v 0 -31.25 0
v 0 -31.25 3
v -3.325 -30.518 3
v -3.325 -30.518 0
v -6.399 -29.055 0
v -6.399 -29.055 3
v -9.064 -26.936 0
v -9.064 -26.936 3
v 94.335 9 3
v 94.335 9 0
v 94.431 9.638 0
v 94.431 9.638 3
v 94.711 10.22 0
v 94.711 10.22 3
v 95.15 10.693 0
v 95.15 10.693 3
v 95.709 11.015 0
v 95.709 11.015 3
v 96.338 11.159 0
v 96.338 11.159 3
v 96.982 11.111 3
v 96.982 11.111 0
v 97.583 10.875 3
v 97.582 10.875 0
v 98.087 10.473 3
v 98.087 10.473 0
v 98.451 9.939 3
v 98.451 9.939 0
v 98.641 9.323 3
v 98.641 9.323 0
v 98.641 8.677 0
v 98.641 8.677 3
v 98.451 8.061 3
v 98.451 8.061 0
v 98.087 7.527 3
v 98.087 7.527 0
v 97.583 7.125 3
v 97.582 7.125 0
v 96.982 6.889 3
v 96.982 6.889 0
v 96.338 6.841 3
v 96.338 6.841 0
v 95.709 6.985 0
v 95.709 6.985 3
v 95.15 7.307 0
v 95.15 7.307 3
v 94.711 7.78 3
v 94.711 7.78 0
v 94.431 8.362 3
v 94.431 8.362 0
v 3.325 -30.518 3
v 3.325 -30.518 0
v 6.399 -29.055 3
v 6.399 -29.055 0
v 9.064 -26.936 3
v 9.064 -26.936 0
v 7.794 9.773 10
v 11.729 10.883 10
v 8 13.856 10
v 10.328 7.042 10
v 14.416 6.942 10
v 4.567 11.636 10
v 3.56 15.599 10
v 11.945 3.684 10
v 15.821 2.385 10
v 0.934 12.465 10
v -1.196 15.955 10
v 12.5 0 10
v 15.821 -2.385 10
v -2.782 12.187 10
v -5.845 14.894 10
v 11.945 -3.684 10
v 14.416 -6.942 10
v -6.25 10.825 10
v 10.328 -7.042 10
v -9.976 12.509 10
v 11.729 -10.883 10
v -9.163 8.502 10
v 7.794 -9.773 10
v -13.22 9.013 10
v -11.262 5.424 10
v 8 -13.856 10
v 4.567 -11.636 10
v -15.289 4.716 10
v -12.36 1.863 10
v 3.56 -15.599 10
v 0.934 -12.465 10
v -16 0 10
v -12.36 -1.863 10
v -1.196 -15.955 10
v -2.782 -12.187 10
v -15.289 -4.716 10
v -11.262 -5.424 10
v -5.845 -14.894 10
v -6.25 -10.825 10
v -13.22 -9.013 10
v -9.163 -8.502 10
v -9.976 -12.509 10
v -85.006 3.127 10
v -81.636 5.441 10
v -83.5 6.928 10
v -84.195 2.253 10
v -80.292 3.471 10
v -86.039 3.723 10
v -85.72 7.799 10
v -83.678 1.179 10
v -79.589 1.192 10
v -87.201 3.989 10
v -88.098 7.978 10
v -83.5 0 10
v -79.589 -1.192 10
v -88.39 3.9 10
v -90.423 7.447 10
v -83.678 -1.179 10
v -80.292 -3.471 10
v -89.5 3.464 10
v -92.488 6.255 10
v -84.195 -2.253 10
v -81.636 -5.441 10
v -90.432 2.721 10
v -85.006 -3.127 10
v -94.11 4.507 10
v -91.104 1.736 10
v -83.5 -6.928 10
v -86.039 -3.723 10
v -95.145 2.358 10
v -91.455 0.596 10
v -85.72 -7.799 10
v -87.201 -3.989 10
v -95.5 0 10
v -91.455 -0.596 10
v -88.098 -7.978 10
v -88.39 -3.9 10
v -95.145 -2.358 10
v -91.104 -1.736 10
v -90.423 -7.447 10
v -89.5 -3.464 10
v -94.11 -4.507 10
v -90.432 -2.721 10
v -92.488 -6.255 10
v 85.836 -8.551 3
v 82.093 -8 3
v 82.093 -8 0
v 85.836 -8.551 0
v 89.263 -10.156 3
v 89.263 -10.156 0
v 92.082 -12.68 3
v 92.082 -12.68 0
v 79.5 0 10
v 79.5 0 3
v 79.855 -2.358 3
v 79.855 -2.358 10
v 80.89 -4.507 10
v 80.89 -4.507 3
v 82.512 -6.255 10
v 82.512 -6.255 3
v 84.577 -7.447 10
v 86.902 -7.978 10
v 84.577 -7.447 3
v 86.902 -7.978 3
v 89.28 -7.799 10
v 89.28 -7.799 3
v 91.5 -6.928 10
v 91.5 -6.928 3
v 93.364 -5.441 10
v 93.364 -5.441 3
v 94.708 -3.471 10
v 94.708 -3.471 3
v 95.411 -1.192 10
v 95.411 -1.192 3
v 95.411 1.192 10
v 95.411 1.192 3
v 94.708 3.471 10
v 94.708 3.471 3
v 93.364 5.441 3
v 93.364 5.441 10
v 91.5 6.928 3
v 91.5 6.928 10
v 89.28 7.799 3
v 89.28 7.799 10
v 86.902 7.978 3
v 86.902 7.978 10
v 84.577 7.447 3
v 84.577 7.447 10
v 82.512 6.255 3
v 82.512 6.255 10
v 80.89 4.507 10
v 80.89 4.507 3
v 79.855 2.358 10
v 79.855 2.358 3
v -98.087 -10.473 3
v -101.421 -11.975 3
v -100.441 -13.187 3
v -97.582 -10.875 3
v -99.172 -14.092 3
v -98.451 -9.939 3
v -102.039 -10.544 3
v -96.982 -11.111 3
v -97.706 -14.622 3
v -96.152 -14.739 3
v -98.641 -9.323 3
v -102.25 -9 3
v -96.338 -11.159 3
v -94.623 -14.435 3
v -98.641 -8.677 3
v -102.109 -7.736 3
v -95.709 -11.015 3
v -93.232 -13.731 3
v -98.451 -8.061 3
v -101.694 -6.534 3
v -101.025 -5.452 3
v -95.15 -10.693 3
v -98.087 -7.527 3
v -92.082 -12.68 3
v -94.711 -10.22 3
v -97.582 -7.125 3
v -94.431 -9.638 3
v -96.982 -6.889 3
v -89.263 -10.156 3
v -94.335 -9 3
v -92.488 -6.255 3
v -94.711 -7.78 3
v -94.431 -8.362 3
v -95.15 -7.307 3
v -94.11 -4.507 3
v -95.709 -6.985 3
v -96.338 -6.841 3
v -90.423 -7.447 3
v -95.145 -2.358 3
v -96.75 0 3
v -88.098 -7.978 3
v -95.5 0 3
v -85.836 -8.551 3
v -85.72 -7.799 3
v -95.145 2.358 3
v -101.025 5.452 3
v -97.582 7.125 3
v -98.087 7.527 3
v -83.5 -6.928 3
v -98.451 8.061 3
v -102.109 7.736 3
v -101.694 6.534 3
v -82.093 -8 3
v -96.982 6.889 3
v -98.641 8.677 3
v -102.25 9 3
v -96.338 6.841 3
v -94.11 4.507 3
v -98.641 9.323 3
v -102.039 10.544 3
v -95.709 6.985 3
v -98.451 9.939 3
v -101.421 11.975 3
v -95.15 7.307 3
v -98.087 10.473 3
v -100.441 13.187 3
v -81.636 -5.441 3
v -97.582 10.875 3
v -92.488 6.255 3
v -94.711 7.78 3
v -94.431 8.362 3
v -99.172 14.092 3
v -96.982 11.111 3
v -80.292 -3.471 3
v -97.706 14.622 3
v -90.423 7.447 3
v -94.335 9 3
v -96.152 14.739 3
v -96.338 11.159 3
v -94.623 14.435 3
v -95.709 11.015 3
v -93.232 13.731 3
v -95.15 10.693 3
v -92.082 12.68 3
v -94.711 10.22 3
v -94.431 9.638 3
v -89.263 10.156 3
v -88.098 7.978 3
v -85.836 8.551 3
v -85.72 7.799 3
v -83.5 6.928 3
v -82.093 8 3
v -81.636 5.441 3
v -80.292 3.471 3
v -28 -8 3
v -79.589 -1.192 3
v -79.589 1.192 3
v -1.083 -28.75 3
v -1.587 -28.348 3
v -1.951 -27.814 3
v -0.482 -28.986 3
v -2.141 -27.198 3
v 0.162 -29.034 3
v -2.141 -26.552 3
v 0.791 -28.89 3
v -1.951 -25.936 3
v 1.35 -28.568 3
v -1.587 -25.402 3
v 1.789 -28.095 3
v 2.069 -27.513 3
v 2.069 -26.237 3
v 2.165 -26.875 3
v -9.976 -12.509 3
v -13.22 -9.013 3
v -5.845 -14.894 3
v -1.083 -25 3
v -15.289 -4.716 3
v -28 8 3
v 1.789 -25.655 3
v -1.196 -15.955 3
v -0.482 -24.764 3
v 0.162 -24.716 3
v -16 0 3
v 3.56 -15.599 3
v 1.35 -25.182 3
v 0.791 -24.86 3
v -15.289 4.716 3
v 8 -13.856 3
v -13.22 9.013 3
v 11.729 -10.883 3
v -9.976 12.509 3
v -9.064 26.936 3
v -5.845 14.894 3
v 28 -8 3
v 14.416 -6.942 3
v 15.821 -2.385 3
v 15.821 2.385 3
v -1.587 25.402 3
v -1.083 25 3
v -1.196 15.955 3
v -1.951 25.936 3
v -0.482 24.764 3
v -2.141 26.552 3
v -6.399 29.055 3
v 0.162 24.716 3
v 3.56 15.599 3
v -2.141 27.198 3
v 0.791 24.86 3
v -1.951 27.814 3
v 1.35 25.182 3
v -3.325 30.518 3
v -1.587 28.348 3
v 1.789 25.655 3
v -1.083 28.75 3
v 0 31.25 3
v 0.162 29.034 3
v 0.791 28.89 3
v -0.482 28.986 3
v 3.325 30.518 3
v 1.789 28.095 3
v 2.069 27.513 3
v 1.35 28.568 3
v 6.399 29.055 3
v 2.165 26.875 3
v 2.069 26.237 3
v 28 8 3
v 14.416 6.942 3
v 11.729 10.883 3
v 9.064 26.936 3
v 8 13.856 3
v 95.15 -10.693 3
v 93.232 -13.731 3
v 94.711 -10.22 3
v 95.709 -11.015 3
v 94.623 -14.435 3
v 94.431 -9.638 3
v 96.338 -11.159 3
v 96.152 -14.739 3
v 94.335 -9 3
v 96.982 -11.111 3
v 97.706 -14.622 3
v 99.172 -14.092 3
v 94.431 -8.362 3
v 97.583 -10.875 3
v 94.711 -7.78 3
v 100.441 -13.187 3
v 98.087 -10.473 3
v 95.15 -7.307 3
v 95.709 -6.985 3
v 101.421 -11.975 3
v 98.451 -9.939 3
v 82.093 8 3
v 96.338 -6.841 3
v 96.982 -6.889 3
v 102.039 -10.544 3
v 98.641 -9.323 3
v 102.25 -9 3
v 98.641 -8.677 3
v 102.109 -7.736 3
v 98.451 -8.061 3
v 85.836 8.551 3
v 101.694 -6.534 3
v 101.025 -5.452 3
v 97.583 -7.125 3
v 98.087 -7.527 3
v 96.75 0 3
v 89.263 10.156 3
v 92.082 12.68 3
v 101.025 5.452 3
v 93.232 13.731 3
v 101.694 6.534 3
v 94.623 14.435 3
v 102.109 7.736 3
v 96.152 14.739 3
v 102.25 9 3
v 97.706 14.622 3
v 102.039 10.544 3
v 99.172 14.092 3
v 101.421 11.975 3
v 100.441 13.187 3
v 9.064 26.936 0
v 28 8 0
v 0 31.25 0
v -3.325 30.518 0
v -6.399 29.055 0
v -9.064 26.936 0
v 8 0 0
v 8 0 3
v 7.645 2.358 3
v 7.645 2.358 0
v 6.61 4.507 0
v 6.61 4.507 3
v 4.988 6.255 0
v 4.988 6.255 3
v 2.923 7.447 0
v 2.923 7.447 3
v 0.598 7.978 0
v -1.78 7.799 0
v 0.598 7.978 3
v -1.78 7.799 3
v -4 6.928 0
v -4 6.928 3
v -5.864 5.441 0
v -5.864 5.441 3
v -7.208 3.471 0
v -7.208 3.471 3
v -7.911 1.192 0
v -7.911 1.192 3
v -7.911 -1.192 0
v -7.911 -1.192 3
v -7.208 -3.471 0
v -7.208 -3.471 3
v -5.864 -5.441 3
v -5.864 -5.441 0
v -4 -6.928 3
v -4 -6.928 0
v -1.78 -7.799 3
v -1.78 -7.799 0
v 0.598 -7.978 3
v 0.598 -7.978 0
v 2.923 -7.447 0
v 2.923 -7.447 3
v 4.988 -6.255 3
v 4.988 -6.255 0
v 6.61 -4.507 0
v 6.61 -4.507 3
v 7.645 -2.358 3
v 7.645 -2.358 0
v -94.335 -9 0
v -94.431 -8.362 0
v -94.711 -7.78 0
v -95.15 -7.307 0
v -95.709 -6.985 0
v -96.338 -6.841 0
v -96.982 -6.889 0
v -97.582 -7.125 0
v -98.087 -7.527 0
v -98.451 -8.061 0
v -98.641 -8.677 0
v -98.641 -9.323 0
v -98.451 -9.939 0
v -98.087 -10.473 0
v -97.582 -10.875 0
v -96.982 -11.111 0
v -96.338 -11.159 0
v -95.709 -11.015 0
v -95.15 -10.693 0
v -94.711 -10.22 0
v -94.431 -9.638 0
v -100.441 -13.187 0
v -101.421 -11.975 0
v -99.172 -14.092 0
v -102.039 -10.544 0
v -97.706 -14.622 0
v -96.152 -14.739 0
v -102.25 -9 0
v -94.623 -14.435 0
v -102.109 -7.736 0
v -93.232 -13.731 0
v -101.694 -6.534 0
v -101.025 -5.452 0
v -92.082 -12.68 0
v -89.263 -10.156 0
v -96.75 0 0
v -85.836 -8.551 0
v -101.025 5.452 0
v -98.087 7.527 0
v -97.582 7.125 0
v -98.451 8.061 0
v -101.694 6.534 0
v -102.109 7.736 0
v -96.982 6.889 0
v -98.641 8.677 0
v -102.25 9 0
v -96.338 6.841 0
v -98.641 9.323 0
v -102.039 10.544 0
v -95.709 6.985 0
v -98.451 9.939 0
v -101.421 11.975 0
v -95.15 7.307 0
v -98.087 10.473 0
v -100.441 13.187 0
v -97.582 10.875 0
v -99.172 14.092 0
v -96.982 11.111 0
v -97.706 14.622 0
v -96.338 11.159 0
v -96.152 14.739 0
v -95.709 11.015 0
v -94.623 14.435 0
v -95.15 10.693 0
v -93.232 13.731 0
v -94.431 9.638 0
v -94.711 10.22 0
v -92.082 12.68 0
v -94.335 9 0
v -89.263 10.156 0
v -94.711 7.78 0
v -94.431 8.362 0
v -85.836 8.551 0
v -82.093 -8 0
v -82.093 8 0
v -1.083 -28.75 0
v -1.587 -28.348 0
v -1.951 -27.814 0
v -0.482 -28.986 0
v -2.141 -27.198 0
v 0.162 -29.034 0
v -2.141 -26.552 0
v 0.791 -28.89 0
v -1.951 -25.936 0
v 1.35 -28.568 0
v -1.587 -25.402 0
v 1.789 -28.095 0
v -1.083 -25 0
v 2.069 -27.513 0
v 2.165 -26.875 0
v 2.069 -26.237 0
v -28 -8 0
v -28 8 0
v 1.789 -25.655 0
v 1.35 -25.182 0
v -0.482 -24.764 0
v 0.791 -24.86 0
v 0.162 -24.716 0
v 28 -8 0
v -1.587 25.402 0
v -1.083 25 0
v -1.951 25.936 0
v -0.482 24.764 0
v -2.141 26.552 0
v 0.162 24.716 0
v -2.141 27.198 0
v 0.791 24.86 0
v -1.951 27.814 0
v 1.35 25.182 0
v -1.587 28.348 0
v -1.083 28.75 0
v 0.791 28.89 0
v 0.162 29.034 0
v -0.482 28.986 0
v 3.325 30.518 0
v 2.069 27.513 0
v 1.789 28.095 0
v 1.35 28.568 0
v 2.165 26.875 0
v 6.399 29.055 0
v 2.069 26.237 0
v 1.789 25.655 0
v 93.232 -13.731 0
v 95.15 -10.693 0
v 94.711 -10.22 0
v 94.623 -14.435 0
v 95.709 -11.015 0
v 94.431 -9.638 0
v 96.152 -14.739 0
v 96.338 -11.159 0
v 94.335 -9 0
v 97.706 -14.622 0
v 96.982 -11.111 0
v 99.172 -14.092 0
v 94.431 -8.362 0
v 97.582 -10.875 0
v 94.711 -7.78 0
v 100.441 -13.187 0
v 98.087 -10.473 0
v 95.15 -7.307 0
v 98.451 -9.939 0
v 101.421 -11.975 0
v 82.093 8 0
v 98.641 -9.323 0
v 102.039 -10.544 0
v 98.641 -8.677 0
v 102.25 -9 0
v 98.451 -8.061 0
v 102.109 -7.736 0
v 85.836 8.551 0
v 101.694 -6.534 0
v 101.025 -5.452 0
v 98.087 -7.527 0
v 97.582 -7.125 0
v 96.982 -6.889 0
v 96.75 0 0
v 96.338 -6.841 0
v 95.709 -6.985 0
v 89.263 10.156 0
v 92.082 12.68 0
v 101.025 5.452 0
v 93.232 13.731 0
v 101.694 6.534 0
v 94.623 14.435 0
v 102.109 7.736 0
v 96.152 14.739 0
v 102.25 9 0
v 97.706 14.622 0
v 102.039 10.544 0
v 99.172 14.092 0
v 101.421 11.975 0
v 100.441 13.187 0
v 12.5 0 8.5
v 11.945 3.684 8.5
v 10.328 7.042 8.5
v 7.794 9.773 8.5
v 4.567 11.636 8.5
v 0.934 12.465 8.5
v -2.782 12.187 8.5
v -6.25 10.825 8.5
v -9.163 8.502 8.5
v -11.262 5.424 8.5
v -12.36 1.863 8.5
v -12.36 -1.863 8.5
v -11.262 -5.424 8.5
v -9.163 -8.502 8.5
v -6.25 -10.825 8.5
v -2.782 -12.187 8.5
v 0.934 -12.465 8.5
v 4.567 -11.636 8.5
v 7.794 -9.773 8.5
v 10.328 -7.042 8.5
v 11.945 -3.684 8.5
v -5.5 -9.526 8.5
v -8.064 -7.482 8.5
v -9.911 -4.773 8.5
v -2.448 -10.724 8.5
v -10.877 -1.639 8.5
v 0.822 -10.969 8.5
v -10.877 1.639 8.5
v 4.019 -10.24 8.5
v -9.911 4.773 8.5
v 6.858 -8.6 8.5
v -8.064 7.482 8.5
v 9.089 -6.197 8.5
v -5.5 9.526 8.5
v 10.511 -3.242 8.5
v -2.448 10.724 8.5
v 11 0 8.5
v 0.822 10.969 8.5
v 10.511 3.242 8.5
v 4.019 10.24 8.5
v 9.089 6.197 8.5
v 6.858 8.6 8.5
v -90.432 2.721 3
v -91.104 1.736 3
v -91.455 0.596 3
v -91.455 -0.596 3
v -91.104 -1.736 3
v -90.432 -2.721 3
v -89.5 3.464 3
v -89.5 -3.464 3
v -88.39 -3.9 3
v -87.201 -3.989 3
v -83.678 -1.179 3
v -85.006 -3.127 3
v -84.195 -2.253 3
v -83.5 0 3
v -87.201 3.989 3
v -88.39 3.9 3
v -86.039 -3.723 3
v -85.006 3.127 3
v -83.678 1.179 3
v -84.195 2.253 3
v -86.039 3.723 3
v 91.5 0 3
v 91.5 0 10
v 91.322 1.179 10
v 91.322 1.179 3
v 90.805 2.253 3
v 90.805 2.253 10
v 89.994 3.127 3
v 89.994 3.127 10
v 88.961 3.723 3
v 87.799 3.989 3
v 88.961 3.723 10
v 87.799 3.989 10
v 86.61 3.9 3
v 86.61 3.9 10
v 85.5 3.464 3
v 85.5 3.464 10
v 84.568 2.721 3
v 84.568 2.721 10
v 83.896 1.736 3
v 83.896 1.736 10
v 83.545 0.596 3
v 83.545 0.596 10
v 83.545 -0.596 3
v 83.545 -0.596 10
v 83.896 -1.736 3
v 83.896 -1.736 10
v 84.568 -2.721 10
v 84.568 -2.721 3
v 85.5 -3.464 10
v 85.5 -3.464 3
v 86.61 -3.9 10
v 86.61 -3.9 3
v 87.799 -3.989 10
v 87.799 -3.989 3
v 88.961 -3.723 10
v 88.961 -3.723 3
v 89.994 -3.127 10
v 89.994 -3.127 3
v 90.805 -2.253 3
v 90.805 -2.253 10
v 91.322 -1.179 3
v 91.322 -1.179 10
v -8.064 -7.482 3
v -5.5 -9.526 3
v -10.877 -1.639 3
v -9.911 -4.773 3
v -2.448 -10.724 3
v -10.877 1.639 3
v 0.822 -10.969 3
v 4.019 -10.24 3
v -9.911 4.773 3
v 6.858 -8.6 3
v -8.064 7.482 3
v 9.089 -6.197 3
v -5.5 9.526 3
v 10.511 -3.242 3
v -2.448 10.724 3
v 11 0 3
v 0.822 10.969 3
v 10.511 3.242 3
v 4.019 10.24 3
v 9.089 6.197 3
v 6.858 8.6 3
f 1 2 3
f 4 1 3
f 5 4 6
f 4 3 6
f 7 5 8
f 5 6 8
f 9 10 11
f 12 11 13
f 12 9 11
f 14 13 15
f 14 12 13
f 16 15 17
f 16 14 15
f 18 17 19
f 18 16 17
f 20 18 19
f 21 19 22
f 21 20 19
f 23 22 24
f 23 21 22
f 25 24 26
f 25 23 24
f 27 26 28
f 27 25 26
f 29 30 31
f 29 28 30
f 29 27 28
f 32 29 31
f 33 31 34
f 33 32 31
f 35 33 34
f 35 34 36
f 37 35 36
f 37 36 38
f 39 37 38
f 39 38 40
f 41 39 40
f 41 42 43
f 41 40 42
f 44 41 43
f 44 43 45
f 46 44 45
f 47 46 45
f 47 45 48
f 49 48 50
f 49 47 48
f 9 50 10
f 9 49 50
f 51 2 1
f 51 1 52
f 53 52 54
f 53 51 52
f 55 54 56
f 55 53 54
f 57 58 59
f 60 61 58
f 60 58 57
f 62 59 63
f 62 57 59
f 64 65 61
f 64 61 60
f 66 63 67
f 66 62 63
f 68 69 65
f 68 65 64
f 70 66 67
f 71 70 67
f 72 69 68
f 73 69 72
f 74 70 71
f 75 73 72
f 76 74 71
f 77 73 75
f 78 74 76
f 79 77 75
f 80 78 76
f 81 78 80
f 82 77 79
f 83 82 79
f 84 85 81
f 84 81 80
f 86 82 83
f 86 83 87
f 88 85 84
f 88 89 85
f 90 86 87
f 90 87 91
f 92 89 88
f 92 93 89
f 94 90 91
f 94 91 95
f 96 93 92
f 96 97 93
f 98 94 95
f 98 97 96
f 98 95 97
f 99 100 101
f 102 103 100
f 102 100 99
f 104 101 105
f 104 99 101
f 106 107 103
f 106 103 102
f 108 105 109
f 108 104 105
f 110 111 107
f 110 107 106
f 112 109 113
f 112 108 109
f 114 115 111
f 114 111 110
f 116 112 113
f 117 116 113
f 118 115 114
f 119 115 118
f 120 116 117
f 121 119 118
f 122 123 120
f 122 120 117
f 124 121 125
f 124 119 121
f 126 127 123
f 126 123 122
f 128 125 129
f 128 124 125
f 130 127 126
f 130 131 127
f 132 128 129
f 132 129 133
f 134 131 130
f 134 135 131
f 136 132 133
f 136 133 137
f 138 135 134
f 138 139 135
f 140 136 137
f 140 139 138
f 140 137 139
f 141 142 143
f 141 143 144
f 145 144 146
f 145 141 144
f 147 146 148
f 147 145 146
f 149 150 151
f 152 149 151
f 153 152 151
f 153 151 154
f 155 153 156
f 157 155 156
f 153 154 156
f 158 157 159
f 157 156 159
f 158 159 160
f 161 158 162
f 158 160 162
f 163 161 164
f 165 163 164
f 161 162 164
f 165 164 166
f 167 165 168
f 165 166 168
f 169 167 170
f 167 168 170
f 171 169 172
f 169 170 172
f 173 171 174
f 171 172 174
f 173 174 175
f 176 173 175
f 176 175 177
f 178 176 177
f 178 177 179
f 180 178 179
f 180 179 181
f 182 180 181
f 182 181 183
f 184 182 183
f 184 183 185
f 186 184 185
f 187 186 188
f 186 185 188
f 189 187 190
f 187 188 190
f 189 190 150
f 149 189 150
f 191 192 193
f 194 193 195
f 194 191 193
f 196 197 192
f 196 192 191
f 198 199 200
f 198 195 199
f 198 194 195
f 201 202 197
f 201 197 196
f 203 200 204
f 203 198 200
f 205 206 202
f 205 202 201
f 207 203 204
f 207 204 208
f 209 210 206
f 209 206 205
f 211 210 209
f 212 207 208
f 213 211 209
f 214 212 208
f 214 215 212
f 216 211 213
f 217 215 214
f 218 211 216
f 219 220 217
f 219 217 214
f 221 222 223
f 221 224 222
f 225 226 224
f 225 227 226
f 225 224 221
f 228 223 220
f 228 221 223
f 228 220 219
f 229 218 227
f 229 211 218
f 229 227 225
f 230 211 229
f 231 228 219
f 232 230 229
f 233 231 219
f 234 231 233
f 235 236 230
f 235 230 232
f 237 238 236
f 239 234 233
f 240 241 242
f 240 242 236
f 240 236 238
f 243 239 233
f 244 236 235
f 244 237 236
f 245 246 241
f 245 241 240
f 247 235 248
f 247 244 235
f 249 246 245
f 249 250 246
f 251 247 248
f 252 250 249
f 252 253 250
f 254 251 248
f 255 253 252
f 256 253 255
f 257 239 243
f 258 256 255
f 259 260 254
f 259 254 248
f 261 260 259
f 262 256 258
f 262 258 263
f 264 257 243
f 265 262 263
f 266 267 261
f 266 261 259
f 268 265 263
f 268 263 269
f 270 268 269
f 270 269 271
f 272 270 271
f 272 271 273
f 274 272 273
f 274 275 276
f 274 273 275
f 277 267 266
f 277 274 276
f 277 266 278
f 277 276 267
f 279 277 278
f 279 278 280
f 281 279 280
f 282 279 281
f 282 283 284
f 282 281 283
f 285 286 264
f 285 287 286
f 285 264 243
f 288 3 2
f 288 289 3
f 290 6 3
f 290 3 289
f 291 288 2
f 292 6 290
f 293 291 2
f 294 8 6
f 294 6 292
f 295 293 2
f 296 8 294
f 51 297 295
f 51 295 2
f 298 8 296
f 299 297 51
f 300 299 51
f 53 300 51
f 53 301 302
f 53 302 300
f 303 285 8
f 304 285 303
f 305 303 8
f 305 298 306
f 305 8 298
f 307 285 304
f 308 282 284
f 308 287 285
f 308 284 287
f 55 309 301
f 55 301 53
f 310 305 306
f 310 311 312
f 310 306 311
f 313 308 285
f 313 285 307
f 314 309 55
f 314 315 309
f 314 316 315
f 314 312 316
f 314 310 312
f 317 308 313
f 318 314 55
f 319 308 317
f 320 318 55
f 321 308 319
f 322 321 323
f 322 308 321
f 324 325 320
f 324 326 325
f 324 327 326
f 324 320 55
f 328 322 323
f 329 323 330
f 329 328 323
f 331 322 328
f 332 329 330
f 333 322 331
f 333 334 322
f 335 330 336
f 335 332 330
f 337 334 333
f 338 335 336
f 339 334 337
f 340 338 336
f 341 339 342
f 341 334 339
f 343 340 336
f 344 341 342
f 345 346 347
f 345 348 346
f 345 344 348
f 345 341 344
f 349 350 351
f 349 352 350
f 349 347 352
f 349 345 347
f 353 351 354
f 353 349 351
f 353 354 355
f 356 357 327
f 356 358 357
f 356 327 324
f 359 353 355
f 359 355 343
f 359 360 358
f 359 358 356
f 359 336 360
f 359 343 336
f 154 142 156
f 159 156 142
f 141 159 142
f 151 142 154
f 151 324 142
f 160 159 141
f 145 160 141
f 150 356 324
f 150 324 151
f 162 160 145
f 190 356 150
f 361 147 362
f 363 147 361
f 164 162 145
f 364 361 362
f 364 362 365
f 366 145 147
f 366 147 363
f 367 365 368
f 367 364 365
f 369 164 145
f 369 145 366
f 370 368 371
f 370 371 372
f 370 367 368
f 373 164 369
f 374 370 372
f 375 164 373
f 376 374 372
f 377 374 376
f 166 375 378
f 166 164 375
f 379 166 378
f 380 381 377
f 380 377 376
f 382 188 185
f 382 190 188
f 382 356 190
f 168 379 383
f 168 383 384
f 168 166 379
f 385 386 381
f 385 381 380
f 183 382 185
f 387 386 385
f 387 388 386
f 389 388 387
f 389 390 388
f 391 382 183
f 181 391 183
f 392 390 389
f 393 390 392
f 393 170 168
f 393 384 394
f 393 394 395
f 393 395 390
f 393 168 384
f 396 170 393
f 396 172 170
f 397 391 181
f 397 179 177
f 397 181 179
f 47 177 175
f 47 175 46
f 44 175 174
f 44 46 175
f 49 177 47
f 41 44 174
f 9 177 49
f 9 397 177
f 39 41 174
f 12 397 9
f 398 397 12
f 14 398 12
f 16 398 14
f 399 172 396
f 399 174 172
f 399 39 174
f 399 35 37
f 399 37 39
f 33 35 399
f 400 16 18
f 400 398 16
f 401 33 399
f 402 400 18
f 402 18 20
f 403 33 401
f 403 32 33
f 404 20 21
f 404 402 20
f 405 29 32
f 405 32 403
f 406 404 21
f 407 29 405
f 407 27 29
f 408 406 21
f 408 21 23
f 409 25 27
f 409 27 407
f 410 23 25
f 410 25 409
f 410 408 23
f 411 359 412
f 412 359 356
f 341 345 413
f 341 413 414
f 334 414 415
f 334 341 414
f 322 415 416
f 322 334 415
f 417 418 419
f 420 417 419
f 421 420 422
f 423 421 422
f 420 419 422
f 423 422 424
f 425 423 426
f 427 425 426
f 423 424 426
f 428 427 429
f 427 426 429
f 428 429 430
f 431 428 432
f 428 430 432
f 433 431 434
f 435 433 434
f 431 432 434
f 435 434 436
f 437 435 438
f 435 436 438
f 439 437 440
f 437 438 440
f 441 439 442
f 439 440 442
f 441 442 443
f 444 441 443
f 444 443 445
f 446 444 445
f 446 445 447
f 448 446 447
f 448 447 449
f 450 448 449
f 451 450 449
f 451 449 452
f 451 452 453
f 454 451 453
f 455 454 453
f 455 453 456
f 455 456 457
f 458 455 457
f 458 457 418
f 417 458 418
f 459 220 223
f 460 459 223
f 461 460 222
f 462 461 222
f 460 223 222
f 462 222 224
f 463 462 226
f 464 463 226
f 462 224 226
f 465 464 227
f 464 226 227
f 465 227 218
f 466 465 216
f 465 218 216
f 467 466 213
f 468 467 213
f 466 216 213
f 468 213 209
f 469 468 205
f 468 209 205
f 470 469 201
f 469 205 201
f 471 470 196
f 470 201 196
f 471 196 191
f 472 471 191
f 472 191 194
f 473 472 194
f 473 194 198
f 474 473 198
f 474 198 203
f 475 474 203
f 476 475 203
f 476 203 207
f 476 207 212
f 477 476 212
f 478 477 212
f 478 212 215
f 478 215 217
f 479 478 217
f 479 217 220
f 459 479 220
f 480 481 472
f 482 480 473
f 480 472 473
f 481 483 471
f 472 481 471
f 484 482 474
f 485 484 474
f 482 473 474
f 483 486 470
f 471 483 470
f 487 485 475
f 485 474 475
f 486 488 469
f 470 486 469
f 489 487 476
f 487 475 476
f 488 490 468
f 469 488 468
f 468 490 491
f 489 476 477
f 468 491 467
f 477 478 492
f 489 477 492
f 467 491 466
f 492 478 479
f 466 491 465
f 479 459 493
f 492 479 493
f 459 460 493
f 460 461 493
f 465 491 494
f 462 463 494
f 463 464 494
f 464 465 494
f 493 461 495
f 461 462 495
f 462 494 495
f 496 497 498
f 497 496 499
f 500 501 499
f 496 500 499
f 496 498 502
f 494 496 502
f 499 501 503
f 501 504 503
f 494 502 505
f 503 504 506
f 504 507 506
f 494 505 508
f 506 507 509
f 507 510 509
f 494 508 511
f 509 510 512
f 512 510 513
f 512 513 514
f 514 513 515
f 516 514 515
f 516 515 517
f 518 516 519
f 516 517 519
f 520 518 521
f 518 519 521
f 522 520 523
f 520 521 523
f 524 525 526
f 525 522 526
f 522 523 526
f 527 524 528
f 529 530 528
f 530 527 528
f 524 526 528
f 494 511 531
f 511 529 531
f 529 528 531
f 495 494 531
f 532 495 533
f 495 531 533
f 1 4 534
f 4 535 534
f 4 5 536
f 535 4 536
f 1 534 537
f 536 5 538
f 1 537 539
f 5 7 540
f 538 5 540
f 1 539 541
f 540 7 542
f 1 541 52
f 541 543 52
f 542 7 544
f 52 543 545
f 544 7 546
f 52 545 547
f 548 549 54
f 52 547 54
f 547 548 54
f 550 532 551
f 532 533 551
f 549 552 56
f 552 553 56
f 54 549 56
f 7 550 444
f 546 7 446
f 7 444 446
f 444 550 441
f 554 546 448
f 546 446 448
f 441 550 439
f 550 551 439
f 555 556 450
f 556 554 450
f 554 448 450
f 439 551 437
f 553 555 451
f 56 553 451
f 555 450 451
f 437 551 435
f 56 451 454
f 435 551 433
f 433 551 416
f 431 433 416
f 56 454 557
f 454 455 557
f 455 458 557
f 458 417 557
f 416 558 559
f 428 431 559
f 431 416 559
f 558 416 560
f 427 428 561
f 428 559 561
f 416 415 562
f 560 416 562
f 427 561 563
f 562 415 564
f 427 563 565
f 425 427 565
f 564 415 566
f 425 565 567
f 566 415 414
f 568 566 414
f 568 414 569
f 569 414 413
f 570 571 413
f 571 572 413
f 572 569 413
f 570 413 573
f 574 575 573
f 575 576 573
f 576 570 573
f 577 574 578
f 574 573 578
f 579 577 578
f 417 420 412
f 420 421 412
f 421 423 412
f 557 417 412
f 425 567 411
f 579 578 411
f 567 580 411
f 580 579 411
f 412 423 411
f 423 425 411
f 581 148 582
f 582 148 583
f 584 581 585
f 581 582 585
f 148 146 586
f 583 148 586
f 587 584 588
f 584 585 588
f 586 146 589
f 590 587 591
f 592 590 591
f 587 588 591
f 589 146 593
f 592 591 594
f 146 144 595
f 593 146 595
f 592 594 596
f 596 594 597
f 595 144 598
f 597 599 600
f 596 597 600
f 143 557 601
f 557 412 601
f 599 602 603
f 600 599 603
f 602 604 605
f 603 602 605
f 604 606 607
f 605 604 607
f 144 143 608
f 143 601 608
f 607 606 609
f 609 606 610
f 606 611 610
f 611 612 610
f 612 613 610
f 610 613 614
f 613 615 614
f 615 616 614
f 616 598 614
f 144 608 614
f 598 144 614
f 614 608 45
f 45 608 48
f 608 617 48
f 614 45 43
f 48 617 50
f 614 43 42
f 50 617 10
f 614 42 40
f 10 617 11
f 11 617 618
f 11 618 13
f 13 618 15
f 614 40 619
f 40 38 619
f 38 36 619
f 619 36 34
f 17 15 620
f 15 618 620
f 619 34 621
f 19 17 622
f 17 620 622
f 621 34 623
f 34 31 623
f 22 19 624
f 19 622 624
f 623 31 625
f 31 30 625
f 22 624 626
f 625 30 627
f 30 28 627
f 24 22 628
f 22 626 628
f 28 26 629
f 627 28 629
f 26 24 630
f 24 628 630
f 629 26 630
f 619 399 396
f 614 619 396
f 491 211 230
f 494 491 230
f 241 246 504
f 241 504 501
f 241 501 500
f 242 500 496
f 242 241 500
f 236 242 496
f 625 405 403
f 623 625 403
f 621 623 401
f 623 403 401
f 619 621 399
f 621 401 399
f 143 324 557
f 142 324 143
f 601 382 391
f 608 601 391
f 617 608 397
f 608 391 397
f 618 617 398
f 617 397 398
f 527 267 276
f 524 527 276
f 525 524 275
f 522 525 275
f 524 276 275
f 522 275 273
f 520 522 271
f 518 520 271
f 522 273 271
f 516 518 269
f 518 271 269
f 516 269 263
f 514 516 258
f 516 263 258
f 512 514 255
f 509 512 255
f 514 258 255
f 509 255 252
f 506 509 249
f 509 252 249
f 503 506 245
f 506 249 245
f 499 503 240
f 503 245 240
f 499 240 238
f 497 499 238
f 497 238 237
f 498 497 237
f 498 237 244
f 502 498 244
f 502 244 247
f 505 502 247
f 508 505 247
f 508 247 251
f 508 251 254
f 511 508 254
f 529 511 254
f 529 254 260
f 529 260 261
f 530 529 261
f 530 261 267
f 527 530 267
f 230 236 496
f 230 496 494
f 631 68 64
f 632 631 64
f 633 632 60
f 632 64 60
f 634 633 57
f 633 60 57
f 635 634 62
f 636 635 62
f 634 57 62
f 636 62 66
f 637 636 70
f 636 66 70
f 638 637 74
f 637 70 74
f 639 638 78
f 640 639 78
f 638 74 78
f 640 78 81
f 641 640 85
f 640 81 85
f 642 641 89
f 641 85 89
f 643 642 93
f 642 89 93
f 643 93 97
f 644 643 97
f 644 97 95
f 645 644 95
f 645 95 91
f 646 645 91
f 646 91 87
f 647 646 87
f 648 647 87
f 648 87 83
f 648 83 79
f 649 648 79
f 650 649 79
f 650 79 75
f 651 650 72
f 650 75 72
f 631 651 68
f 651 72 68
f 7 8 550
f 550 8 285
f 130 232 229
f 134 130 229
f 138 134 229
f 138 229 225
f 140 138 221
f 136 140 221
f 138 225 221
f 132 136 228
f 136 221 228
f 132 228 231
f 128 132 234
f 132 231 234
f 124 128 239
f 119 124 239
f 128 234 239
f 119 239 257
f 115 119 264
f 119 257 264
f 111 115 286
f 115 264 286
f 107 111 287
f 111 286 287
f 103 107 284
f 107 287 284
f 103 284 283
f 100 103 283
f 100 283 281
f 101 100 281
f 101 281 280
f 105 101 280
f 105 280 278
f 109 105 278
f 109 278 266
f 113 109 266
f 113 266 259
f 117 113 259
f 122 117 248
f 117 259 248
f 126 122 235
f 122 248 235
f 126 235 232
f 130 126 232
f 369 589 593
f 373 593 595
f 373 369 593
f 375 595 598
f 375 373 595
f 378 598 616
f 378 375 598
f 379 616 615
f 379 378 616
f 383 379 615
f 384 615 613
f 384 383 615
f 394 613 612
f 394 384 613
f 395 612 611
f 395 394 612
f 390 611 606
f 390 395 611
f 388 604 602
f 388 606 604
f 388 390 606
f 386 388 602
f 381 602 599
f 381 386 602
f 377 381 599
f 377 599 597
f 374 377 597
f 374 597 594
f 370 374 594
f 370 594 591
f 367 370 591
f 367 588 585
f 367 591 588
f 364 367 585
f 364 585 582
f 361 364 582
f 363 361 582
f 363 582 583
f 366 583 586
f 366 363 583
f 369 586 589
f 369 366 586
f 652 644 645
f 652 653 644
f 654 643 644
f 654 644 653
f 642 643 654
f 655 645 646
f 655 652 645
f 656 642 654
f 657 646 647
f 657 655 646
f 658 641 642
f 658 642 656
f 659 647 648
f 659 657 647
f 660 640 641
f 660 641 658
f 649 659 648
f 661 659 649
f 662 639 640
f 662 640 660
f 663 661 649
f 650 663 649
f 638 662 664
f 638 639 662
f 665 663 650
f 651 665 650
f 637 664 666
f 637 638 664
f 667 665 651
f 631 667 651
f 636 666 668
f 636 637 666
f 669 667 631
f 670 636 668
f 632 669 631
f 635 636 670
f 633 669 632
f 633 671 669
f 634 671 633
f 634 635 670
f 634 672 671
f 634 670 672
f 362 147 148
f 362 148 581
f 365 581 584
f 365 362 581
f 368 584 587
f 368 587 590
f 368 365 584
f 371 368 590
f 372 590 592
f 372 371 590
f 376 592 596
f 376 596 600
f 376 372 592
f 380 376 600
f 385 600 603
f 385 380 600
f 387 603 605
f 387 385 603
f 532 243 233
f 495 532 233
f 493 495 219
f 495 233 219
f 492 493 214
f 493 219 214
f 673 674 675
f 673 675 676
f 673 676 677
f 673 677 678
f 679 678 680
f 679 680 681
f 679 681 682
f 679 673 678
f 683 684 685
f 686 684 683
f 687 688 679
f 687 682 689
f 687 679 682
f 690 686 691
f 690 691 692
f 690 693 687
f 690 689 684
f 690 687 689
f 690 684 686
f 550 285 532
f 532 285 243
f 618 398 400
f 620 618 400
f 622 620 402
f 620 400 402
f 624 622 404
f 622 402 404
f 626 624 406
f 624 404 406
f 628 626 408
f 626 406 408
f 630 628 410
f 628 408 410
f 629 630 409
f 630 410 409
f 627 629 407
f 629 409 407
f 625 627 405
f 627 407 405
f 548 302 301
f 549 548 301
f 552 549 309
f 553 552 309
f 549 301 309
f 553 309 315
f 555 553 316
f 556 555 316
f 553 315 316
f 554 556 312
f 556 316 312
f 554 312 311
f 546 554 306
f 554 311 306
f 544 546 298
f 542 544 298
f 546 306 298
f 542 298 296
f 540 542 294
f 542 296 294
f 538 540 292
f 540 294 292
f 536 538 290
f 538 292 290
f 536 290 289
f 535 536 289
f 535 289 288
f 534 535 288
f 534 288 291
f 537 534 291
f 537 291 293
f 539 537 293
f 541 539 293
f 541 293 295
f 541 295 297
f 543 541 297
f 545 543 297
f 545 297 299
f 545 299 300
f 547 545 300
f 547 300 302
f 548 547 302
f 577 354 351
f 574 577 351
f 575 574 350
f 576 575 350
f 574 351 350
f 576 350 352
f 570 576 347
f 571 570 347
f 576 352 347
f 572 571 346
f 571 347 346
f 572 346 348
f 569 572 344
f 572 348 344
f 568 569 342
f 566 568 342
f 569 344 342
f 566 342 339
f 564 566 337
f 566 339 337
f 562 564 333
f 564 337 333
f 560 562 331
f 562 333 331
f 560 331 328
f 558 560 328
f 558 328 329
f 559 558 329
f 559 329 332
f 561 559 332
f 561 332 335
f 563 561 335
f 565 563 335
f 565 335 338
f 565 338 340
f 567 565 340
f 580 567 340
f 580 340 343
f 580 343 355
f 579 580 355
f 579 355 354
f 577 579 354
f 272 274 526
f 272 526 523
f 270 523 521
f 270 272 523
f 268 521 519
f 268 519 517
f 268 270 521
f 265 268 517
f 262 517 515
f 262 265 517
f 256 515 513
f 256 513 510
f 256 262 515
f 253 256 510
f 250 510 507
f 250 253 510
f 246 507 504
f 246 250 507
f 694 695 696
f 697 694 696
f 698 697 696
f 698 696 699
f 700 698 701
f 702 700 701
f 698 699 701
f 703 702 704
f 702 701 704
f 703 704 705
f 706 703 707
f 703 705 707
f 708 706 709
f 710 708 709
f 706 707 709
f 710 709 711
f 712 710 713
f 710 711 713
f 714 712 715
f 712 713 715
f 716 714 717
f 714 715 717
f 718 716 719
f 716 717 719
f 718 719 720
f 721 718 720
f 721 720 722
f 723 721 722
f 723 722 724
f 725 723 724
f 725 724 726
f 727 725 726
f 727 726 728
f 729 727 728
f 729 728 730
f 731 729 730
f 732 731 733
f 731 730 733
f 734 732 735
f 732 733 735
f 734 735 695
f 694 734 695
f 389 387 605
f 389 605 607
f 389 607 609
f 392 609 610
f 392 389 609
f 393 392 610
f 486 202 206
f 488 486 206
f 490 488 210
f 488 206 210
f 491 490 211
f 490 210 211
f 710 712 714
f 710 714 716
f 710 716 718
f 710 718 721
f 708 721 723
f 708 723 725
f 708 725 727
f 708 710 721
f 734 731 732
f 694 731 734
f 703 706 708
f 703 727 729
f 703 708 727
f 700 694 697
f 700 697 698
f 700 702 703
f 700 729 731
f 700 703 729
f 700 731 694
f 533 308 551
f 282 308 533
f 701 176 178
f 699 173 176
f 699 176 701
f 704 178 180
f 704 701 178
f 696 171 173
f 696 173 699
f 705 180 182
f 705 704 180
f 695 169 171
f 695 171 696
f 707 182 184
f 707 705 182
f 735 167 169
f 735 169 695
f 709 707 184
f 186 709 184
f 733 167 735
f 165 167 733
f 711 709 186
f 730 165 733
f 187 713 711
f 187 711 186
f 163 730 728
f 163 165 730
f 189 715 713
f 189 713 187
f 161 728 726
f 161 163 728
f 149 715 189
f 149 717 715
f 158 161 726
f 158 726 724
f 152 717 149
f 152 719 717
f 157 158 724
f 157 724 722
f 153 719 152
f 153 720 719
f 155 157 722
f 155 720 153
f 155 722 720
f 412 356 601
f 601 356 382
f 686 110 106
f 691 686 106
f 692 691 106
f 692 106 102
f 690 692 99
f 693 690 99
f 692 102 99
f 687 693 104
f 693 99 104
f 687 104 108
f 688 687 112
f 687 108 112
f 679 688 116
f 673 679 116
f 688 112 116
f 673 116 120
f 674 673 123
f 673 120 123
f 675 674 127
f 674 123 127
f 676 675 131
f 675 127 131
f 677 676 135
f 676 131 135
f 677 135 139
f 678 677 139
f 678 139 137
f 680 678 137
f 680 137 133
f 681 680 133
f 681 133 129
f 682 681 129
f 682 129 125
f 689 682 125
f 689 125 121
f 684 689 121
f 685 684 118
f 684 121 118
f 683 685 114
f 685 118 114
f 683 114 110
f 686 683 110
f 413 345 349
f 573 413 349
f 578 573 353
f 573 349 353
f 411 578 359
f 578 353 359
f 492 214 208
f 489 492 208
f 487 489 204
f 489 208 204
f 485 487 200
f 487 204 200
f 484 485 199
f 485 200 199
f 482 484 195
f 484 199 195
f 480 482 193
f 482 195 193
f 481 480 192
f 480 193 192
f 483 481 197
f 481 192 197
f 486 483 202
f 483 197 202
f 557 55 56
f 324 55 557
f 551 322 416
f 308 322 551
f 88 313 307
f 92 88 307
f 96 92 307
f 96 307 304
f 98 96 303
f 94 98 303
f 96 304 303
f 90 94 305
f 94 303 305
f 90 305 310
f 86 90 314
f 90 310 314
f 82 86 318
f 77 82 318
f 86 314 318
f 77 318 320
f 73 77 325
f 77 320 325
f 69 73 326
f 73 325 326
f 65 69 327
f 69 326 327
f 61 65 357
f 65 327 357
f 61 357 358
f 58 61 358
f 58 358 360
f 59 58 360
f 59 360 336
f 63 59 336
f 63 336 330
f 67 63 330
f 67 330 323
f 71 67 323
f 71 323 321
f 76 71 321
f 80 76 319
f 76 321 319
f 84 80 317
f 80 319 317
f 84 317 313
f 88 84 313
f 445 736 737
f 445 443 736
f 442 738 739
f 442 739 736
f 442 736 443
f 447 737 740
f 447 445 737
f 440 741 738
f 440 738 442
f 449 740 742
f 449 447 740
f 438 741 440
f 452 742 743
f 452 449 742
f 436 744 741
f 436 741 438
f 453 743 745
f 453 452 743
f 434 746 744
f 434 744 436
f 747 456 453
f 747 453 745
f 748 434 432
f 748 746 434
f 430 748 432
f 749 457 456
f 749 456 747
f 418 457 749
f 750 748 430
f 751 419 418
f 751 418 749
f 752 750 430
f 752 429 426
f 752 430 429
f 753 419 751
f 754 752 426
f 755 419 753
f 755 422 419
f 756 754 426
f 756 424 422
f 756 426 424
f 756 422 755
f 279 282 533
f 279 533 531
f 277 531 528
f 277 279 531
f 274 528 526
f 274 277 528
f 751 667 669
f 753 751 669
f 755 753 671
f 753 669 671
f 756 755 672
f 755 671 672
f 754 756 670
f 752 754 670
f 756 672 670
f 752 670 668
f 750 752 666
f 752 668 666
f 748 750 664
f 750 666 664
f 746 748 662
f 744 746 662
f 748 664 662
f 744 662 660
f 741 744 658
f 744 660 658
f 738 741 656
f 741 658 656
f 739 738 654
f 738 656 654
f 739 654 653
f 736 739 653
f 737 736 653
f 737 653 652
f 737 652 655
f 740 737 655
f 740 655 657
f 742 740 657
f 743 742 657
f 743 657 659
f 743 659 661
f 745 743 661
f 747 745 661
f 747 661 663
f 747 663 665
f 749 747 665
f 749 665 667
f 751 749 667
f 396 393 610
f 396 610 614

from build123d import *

# Parameters (mm, degrees)
SKETCH1_W               = 204.5
SKETCH1_H               = 62.5
BOSS_EXTRUDE1_DEPTH     = 3
SKETCH2_R               = 8
BOSS_EXTRUDE2_DEPTH     = 7
SKETCH3_R               = 16
BOSS_EXTRUDE3_DEPTH     = 7
SKETCH4_R               = 2.165
CUT_EXTRUDE1_DEPTH      = 108.147678463
SKETCH5_R               = 2.165
CUT_EXTRUDE2_DEPTH      = 108.147678463
CUT_EXTRUDE3_DEPTH      = 7
MIRROR2_COPY_1_SKETCH_R = 2.165
MIRROR2_COPY_1_DEPTH    = 108.147678463
MIRROR2_COPY_2_DEPTH    = 7
MIRROR2_COPY_3_SKETCH_R = 2.165
MIRROR2_COPY_3_DEPTH    = 108.147678463
SKETCH7_R               = 12.5
CUT_EXTRUDE4_DEPTH      = 1.5
SKETCH9_R               = 11
CUT_EXTRUDE5_DEPTH      = 7
SKETCH10_R              = 8
CUT_EXTRUDE6_DEPTH      = 108.147678463
SKETCH11_R              = 4
CUT_EXTRUDE7_DEPTH      = 7


with BuildPart() as part:
    # Sketch1 → Boss-Extrude1 (new body)
    with BuildSketch(Plane.XY):
        Rectangle(SKETCH1_W, SKETCH1_H)
    extrude(amount=BOSS_EXTRUDE1_DEPTH)

    # Sketch2 → Boss-Extrude2 (add)
    with BuildSketch(Plane.XY.offset(3)):
        with Locations(Location((-87.5, 0, 0), (0, 0, 180))):
            Circle(SKETCH2_R)
        with Locations(Location((87.5, 0, 0), (0, 0, 180))):
            Circle(SKETCH2_R)
    extrude(amount=BOSS_EXTRUDE2_DEPTH)

    # Sketch3 → Boss-Extrude3 (add)
    with BuildSketch(Plane.XY.offset(3)):
        with Locations(Location((0, 0, 0), (0, 0, 180))):
            Circle(SKETCH3_R)
    extrude(amount=BOSS_EXTRUDE3_DEPTH)

    # Sketch4 → Cut-Extrude1 (cut, through all)
    with BuildSketch(Plane.XY.offset(3)):
        with Locations((-96.5, 9)):
            Circle(SKETCH4_R)
        with Locations((-96.5, -9)):
            Circle(SKETCH4_R)
    cut_extrude1 = extrude(amount=-CUT_EXTRUDE1_DEPTH, mode=Mode.SUBTRACT)

    # Sketch5 → Cut-Extrude2 (cut, through all)
    with BuildSketch(Plane.XY.offset(3)):
        with Locations((0, 26.875)):
            Circle(SKETCH5_R)
        with Locations((0, -26.875)):
            Circle(SKETCH5_R)
    extrude(amount=-CUT_EXTRUDE2_DEPTH, mode=Mode.SUBTRACT)

    # Sketch6 → Cut-Extrude3 (cut)
    with BuildSketch(Plane.XY.offset(3)):
        with BuildLine():
            Line((-102.25, 0), (-102.25, -9))
            ThreePointArc((-102.25, -9), (-101.935103767, -7.123261595), (-101.024905378, -5.452080705))
            Line((-101.024905378, -5.452080705), (-96.75, 0))
            Line((-96.75, 0), (-102.25, 0))
        make_face()
        with BuildLine():
            Line((-28, -8), (-82.092970466, -8))
            ThreePointArc((-82.092970466, -8), (-87.608403359, -9.22799932), (-92.081844276, -12.68))
            ThreePointArc((-92.081844276, -12.68), (-98.456796437, -14.406796437), (-102.25, -9))
            Line((-102.25, -9), (-102.25, -31.25))
            Line((-102.25, -31.25), (0, -31.25))
            ThreePointArc((0, -31.25), (-4.903490235, -29.873770102), (-9.063851408, -26.936148592))
            Line((-9.063851408, -26.936148592), (-28, -8))
        make_face()
    cut_extrude3 = extrude(amount=-CUT_EXTRUDE3_DEPTH, mode=Mode.SUBTRACT)

    # Mirror1: Cut-Extrude1, Cut-Extrude3 across plane
    add(cut_extrude1.mirror(Plane(origin=(0, 0, 0), x_dir=(0, 0, 1), z_dir=(1, 0, 0))), mode=Mode.SUBTRACT)
    add(cut_extrude3.mirror(Plane(origin=(0, 0, 0), x_dir=(0, 0, 1), z_dir=(1, 0, 0))), mode=Mode.SUBTRACT)

    # Mirror2: Cut-Extrude3 across plane
    add(cut_extrude3.mirror(Plane.ZX), mode=Mode.SUBTRACT)

    # Mirror2 copy 1 sketch → Mirror2 copy 1 (cut, through all)
    with BuildSketch(Plane(origin=(0, 0, 3), x_dir=(-1, 0, 0), z_dir=(0, 0, 1))):
        with Locations((-96.5, 9)):
            Circle(MIRROR2_COPY_1_SKETCH_R)
        with Locations((-96.5, -9)):
            Circle(MIRROR2_COPY_1_SKETCH_R)
    extrude(amount=-MIRROR2_COPY_1_DEPTH, mode=Mode.SUBTRACT)

    # Mirror2 copy 2 sketch → Mirror2 copy 2 (cut)
    with BuildSketch(Plane(origin=(0, 0, 3), x_dir=(-1, 0, 0), z_dir=(0, 0, 1))):
        with BuildLine():
            Line((-102.25, 0), (-102.25, -9))
            ThreePointArc((-102.25, -9), (-101.935103767, -7.123261595), (-101.024905378, -5.452080705))
            Line((-101.024905378, -5.452080705), (-96.75, 0))
            Line((-96.75, 0), (-102.25, 0))
        make_face()
        with BuildLine():
            Line((-28, -8), (-82.092970466, -8))
            ThreePointArc((-82.092970466, -8), (-87.608403359, -9.22799932), (-92.081844276, -12.68))
            ThreePointArc((-92.081844276, -12.68), (-98.456796437, -14.406796437), (-102.25, -9))
            Line((-102.25, -9), (-102.25, -31.25))
            Line((-102.25, -31.25), (0, -31.25))
            ThreePointArc((0, -31.25), (-4.903490235, -29.873770102), (-9.063851408, -26.936148592))
            Line((-9.063851408, -26.936148592), (-28, -8))
        make_face()
    extrude(amount=-MIRROR2_COPY_2_DEPTH, mode=Mode.SUBTRACT)

    # Mirror2 copy 3 sketch → Mirror2 copy 3 (cut, through all)
    with BuildSketch(Plane.XY.offset(3)):
        with Locations((-96.5, -9)):
            Circle(MIRROR2_COPY_3_SKETCH_R)
        with Locations((-96.5, 9)):
            Circle(MIRROR2_COPY_3_SKETCH_R)
    extrude(amount=-MIRROR2_COPY_3_DEPTH, mode=Mode.SUBTRACT)

    # Sketch7 → Cut-Extrude4 (cut)
    with BuildSketch(Plane.XY.offset(10)):
        Circle(SKETCH7_R)
    extrude(amount=-CUT_EXTRUDE4_DEPTH, mode=Mode.SUBTRACT)

    # Sketch9 → Cut-Extrude5 (cut)
    with BuildSketch(Plane.XY.offset(10)):
        Circle(SKETCH9_R)
    extrude(amount=-CUT_EXTRUDE5_DEPTH, mode=Mode.SUBTRACT)

    # Sketch10 → Cut-Extrude6 (cut, through all)
    with BuildSketch(Plane.XY.offset(3)):
        Circle(SKETCH10_R)
    extrude(amount=-CUT_EXTRUDE6_DEPTH, mode=Mode.SUBTRACT)

    # Sketch11 → Cut-Extrude7 (cut)
    with BuildSketch(Plane.XY.offset(10)):
        with Locations((-87.5, 0)):
            Circle(SKETCH11_R)
        with Locations((87.5, 0)):
            Circle(SKETCH11_R)
    extrude(amount=-CUT_EXTRUDE7_DEPTH, mode=Mode.SUBTRACT)


solid = part.part
